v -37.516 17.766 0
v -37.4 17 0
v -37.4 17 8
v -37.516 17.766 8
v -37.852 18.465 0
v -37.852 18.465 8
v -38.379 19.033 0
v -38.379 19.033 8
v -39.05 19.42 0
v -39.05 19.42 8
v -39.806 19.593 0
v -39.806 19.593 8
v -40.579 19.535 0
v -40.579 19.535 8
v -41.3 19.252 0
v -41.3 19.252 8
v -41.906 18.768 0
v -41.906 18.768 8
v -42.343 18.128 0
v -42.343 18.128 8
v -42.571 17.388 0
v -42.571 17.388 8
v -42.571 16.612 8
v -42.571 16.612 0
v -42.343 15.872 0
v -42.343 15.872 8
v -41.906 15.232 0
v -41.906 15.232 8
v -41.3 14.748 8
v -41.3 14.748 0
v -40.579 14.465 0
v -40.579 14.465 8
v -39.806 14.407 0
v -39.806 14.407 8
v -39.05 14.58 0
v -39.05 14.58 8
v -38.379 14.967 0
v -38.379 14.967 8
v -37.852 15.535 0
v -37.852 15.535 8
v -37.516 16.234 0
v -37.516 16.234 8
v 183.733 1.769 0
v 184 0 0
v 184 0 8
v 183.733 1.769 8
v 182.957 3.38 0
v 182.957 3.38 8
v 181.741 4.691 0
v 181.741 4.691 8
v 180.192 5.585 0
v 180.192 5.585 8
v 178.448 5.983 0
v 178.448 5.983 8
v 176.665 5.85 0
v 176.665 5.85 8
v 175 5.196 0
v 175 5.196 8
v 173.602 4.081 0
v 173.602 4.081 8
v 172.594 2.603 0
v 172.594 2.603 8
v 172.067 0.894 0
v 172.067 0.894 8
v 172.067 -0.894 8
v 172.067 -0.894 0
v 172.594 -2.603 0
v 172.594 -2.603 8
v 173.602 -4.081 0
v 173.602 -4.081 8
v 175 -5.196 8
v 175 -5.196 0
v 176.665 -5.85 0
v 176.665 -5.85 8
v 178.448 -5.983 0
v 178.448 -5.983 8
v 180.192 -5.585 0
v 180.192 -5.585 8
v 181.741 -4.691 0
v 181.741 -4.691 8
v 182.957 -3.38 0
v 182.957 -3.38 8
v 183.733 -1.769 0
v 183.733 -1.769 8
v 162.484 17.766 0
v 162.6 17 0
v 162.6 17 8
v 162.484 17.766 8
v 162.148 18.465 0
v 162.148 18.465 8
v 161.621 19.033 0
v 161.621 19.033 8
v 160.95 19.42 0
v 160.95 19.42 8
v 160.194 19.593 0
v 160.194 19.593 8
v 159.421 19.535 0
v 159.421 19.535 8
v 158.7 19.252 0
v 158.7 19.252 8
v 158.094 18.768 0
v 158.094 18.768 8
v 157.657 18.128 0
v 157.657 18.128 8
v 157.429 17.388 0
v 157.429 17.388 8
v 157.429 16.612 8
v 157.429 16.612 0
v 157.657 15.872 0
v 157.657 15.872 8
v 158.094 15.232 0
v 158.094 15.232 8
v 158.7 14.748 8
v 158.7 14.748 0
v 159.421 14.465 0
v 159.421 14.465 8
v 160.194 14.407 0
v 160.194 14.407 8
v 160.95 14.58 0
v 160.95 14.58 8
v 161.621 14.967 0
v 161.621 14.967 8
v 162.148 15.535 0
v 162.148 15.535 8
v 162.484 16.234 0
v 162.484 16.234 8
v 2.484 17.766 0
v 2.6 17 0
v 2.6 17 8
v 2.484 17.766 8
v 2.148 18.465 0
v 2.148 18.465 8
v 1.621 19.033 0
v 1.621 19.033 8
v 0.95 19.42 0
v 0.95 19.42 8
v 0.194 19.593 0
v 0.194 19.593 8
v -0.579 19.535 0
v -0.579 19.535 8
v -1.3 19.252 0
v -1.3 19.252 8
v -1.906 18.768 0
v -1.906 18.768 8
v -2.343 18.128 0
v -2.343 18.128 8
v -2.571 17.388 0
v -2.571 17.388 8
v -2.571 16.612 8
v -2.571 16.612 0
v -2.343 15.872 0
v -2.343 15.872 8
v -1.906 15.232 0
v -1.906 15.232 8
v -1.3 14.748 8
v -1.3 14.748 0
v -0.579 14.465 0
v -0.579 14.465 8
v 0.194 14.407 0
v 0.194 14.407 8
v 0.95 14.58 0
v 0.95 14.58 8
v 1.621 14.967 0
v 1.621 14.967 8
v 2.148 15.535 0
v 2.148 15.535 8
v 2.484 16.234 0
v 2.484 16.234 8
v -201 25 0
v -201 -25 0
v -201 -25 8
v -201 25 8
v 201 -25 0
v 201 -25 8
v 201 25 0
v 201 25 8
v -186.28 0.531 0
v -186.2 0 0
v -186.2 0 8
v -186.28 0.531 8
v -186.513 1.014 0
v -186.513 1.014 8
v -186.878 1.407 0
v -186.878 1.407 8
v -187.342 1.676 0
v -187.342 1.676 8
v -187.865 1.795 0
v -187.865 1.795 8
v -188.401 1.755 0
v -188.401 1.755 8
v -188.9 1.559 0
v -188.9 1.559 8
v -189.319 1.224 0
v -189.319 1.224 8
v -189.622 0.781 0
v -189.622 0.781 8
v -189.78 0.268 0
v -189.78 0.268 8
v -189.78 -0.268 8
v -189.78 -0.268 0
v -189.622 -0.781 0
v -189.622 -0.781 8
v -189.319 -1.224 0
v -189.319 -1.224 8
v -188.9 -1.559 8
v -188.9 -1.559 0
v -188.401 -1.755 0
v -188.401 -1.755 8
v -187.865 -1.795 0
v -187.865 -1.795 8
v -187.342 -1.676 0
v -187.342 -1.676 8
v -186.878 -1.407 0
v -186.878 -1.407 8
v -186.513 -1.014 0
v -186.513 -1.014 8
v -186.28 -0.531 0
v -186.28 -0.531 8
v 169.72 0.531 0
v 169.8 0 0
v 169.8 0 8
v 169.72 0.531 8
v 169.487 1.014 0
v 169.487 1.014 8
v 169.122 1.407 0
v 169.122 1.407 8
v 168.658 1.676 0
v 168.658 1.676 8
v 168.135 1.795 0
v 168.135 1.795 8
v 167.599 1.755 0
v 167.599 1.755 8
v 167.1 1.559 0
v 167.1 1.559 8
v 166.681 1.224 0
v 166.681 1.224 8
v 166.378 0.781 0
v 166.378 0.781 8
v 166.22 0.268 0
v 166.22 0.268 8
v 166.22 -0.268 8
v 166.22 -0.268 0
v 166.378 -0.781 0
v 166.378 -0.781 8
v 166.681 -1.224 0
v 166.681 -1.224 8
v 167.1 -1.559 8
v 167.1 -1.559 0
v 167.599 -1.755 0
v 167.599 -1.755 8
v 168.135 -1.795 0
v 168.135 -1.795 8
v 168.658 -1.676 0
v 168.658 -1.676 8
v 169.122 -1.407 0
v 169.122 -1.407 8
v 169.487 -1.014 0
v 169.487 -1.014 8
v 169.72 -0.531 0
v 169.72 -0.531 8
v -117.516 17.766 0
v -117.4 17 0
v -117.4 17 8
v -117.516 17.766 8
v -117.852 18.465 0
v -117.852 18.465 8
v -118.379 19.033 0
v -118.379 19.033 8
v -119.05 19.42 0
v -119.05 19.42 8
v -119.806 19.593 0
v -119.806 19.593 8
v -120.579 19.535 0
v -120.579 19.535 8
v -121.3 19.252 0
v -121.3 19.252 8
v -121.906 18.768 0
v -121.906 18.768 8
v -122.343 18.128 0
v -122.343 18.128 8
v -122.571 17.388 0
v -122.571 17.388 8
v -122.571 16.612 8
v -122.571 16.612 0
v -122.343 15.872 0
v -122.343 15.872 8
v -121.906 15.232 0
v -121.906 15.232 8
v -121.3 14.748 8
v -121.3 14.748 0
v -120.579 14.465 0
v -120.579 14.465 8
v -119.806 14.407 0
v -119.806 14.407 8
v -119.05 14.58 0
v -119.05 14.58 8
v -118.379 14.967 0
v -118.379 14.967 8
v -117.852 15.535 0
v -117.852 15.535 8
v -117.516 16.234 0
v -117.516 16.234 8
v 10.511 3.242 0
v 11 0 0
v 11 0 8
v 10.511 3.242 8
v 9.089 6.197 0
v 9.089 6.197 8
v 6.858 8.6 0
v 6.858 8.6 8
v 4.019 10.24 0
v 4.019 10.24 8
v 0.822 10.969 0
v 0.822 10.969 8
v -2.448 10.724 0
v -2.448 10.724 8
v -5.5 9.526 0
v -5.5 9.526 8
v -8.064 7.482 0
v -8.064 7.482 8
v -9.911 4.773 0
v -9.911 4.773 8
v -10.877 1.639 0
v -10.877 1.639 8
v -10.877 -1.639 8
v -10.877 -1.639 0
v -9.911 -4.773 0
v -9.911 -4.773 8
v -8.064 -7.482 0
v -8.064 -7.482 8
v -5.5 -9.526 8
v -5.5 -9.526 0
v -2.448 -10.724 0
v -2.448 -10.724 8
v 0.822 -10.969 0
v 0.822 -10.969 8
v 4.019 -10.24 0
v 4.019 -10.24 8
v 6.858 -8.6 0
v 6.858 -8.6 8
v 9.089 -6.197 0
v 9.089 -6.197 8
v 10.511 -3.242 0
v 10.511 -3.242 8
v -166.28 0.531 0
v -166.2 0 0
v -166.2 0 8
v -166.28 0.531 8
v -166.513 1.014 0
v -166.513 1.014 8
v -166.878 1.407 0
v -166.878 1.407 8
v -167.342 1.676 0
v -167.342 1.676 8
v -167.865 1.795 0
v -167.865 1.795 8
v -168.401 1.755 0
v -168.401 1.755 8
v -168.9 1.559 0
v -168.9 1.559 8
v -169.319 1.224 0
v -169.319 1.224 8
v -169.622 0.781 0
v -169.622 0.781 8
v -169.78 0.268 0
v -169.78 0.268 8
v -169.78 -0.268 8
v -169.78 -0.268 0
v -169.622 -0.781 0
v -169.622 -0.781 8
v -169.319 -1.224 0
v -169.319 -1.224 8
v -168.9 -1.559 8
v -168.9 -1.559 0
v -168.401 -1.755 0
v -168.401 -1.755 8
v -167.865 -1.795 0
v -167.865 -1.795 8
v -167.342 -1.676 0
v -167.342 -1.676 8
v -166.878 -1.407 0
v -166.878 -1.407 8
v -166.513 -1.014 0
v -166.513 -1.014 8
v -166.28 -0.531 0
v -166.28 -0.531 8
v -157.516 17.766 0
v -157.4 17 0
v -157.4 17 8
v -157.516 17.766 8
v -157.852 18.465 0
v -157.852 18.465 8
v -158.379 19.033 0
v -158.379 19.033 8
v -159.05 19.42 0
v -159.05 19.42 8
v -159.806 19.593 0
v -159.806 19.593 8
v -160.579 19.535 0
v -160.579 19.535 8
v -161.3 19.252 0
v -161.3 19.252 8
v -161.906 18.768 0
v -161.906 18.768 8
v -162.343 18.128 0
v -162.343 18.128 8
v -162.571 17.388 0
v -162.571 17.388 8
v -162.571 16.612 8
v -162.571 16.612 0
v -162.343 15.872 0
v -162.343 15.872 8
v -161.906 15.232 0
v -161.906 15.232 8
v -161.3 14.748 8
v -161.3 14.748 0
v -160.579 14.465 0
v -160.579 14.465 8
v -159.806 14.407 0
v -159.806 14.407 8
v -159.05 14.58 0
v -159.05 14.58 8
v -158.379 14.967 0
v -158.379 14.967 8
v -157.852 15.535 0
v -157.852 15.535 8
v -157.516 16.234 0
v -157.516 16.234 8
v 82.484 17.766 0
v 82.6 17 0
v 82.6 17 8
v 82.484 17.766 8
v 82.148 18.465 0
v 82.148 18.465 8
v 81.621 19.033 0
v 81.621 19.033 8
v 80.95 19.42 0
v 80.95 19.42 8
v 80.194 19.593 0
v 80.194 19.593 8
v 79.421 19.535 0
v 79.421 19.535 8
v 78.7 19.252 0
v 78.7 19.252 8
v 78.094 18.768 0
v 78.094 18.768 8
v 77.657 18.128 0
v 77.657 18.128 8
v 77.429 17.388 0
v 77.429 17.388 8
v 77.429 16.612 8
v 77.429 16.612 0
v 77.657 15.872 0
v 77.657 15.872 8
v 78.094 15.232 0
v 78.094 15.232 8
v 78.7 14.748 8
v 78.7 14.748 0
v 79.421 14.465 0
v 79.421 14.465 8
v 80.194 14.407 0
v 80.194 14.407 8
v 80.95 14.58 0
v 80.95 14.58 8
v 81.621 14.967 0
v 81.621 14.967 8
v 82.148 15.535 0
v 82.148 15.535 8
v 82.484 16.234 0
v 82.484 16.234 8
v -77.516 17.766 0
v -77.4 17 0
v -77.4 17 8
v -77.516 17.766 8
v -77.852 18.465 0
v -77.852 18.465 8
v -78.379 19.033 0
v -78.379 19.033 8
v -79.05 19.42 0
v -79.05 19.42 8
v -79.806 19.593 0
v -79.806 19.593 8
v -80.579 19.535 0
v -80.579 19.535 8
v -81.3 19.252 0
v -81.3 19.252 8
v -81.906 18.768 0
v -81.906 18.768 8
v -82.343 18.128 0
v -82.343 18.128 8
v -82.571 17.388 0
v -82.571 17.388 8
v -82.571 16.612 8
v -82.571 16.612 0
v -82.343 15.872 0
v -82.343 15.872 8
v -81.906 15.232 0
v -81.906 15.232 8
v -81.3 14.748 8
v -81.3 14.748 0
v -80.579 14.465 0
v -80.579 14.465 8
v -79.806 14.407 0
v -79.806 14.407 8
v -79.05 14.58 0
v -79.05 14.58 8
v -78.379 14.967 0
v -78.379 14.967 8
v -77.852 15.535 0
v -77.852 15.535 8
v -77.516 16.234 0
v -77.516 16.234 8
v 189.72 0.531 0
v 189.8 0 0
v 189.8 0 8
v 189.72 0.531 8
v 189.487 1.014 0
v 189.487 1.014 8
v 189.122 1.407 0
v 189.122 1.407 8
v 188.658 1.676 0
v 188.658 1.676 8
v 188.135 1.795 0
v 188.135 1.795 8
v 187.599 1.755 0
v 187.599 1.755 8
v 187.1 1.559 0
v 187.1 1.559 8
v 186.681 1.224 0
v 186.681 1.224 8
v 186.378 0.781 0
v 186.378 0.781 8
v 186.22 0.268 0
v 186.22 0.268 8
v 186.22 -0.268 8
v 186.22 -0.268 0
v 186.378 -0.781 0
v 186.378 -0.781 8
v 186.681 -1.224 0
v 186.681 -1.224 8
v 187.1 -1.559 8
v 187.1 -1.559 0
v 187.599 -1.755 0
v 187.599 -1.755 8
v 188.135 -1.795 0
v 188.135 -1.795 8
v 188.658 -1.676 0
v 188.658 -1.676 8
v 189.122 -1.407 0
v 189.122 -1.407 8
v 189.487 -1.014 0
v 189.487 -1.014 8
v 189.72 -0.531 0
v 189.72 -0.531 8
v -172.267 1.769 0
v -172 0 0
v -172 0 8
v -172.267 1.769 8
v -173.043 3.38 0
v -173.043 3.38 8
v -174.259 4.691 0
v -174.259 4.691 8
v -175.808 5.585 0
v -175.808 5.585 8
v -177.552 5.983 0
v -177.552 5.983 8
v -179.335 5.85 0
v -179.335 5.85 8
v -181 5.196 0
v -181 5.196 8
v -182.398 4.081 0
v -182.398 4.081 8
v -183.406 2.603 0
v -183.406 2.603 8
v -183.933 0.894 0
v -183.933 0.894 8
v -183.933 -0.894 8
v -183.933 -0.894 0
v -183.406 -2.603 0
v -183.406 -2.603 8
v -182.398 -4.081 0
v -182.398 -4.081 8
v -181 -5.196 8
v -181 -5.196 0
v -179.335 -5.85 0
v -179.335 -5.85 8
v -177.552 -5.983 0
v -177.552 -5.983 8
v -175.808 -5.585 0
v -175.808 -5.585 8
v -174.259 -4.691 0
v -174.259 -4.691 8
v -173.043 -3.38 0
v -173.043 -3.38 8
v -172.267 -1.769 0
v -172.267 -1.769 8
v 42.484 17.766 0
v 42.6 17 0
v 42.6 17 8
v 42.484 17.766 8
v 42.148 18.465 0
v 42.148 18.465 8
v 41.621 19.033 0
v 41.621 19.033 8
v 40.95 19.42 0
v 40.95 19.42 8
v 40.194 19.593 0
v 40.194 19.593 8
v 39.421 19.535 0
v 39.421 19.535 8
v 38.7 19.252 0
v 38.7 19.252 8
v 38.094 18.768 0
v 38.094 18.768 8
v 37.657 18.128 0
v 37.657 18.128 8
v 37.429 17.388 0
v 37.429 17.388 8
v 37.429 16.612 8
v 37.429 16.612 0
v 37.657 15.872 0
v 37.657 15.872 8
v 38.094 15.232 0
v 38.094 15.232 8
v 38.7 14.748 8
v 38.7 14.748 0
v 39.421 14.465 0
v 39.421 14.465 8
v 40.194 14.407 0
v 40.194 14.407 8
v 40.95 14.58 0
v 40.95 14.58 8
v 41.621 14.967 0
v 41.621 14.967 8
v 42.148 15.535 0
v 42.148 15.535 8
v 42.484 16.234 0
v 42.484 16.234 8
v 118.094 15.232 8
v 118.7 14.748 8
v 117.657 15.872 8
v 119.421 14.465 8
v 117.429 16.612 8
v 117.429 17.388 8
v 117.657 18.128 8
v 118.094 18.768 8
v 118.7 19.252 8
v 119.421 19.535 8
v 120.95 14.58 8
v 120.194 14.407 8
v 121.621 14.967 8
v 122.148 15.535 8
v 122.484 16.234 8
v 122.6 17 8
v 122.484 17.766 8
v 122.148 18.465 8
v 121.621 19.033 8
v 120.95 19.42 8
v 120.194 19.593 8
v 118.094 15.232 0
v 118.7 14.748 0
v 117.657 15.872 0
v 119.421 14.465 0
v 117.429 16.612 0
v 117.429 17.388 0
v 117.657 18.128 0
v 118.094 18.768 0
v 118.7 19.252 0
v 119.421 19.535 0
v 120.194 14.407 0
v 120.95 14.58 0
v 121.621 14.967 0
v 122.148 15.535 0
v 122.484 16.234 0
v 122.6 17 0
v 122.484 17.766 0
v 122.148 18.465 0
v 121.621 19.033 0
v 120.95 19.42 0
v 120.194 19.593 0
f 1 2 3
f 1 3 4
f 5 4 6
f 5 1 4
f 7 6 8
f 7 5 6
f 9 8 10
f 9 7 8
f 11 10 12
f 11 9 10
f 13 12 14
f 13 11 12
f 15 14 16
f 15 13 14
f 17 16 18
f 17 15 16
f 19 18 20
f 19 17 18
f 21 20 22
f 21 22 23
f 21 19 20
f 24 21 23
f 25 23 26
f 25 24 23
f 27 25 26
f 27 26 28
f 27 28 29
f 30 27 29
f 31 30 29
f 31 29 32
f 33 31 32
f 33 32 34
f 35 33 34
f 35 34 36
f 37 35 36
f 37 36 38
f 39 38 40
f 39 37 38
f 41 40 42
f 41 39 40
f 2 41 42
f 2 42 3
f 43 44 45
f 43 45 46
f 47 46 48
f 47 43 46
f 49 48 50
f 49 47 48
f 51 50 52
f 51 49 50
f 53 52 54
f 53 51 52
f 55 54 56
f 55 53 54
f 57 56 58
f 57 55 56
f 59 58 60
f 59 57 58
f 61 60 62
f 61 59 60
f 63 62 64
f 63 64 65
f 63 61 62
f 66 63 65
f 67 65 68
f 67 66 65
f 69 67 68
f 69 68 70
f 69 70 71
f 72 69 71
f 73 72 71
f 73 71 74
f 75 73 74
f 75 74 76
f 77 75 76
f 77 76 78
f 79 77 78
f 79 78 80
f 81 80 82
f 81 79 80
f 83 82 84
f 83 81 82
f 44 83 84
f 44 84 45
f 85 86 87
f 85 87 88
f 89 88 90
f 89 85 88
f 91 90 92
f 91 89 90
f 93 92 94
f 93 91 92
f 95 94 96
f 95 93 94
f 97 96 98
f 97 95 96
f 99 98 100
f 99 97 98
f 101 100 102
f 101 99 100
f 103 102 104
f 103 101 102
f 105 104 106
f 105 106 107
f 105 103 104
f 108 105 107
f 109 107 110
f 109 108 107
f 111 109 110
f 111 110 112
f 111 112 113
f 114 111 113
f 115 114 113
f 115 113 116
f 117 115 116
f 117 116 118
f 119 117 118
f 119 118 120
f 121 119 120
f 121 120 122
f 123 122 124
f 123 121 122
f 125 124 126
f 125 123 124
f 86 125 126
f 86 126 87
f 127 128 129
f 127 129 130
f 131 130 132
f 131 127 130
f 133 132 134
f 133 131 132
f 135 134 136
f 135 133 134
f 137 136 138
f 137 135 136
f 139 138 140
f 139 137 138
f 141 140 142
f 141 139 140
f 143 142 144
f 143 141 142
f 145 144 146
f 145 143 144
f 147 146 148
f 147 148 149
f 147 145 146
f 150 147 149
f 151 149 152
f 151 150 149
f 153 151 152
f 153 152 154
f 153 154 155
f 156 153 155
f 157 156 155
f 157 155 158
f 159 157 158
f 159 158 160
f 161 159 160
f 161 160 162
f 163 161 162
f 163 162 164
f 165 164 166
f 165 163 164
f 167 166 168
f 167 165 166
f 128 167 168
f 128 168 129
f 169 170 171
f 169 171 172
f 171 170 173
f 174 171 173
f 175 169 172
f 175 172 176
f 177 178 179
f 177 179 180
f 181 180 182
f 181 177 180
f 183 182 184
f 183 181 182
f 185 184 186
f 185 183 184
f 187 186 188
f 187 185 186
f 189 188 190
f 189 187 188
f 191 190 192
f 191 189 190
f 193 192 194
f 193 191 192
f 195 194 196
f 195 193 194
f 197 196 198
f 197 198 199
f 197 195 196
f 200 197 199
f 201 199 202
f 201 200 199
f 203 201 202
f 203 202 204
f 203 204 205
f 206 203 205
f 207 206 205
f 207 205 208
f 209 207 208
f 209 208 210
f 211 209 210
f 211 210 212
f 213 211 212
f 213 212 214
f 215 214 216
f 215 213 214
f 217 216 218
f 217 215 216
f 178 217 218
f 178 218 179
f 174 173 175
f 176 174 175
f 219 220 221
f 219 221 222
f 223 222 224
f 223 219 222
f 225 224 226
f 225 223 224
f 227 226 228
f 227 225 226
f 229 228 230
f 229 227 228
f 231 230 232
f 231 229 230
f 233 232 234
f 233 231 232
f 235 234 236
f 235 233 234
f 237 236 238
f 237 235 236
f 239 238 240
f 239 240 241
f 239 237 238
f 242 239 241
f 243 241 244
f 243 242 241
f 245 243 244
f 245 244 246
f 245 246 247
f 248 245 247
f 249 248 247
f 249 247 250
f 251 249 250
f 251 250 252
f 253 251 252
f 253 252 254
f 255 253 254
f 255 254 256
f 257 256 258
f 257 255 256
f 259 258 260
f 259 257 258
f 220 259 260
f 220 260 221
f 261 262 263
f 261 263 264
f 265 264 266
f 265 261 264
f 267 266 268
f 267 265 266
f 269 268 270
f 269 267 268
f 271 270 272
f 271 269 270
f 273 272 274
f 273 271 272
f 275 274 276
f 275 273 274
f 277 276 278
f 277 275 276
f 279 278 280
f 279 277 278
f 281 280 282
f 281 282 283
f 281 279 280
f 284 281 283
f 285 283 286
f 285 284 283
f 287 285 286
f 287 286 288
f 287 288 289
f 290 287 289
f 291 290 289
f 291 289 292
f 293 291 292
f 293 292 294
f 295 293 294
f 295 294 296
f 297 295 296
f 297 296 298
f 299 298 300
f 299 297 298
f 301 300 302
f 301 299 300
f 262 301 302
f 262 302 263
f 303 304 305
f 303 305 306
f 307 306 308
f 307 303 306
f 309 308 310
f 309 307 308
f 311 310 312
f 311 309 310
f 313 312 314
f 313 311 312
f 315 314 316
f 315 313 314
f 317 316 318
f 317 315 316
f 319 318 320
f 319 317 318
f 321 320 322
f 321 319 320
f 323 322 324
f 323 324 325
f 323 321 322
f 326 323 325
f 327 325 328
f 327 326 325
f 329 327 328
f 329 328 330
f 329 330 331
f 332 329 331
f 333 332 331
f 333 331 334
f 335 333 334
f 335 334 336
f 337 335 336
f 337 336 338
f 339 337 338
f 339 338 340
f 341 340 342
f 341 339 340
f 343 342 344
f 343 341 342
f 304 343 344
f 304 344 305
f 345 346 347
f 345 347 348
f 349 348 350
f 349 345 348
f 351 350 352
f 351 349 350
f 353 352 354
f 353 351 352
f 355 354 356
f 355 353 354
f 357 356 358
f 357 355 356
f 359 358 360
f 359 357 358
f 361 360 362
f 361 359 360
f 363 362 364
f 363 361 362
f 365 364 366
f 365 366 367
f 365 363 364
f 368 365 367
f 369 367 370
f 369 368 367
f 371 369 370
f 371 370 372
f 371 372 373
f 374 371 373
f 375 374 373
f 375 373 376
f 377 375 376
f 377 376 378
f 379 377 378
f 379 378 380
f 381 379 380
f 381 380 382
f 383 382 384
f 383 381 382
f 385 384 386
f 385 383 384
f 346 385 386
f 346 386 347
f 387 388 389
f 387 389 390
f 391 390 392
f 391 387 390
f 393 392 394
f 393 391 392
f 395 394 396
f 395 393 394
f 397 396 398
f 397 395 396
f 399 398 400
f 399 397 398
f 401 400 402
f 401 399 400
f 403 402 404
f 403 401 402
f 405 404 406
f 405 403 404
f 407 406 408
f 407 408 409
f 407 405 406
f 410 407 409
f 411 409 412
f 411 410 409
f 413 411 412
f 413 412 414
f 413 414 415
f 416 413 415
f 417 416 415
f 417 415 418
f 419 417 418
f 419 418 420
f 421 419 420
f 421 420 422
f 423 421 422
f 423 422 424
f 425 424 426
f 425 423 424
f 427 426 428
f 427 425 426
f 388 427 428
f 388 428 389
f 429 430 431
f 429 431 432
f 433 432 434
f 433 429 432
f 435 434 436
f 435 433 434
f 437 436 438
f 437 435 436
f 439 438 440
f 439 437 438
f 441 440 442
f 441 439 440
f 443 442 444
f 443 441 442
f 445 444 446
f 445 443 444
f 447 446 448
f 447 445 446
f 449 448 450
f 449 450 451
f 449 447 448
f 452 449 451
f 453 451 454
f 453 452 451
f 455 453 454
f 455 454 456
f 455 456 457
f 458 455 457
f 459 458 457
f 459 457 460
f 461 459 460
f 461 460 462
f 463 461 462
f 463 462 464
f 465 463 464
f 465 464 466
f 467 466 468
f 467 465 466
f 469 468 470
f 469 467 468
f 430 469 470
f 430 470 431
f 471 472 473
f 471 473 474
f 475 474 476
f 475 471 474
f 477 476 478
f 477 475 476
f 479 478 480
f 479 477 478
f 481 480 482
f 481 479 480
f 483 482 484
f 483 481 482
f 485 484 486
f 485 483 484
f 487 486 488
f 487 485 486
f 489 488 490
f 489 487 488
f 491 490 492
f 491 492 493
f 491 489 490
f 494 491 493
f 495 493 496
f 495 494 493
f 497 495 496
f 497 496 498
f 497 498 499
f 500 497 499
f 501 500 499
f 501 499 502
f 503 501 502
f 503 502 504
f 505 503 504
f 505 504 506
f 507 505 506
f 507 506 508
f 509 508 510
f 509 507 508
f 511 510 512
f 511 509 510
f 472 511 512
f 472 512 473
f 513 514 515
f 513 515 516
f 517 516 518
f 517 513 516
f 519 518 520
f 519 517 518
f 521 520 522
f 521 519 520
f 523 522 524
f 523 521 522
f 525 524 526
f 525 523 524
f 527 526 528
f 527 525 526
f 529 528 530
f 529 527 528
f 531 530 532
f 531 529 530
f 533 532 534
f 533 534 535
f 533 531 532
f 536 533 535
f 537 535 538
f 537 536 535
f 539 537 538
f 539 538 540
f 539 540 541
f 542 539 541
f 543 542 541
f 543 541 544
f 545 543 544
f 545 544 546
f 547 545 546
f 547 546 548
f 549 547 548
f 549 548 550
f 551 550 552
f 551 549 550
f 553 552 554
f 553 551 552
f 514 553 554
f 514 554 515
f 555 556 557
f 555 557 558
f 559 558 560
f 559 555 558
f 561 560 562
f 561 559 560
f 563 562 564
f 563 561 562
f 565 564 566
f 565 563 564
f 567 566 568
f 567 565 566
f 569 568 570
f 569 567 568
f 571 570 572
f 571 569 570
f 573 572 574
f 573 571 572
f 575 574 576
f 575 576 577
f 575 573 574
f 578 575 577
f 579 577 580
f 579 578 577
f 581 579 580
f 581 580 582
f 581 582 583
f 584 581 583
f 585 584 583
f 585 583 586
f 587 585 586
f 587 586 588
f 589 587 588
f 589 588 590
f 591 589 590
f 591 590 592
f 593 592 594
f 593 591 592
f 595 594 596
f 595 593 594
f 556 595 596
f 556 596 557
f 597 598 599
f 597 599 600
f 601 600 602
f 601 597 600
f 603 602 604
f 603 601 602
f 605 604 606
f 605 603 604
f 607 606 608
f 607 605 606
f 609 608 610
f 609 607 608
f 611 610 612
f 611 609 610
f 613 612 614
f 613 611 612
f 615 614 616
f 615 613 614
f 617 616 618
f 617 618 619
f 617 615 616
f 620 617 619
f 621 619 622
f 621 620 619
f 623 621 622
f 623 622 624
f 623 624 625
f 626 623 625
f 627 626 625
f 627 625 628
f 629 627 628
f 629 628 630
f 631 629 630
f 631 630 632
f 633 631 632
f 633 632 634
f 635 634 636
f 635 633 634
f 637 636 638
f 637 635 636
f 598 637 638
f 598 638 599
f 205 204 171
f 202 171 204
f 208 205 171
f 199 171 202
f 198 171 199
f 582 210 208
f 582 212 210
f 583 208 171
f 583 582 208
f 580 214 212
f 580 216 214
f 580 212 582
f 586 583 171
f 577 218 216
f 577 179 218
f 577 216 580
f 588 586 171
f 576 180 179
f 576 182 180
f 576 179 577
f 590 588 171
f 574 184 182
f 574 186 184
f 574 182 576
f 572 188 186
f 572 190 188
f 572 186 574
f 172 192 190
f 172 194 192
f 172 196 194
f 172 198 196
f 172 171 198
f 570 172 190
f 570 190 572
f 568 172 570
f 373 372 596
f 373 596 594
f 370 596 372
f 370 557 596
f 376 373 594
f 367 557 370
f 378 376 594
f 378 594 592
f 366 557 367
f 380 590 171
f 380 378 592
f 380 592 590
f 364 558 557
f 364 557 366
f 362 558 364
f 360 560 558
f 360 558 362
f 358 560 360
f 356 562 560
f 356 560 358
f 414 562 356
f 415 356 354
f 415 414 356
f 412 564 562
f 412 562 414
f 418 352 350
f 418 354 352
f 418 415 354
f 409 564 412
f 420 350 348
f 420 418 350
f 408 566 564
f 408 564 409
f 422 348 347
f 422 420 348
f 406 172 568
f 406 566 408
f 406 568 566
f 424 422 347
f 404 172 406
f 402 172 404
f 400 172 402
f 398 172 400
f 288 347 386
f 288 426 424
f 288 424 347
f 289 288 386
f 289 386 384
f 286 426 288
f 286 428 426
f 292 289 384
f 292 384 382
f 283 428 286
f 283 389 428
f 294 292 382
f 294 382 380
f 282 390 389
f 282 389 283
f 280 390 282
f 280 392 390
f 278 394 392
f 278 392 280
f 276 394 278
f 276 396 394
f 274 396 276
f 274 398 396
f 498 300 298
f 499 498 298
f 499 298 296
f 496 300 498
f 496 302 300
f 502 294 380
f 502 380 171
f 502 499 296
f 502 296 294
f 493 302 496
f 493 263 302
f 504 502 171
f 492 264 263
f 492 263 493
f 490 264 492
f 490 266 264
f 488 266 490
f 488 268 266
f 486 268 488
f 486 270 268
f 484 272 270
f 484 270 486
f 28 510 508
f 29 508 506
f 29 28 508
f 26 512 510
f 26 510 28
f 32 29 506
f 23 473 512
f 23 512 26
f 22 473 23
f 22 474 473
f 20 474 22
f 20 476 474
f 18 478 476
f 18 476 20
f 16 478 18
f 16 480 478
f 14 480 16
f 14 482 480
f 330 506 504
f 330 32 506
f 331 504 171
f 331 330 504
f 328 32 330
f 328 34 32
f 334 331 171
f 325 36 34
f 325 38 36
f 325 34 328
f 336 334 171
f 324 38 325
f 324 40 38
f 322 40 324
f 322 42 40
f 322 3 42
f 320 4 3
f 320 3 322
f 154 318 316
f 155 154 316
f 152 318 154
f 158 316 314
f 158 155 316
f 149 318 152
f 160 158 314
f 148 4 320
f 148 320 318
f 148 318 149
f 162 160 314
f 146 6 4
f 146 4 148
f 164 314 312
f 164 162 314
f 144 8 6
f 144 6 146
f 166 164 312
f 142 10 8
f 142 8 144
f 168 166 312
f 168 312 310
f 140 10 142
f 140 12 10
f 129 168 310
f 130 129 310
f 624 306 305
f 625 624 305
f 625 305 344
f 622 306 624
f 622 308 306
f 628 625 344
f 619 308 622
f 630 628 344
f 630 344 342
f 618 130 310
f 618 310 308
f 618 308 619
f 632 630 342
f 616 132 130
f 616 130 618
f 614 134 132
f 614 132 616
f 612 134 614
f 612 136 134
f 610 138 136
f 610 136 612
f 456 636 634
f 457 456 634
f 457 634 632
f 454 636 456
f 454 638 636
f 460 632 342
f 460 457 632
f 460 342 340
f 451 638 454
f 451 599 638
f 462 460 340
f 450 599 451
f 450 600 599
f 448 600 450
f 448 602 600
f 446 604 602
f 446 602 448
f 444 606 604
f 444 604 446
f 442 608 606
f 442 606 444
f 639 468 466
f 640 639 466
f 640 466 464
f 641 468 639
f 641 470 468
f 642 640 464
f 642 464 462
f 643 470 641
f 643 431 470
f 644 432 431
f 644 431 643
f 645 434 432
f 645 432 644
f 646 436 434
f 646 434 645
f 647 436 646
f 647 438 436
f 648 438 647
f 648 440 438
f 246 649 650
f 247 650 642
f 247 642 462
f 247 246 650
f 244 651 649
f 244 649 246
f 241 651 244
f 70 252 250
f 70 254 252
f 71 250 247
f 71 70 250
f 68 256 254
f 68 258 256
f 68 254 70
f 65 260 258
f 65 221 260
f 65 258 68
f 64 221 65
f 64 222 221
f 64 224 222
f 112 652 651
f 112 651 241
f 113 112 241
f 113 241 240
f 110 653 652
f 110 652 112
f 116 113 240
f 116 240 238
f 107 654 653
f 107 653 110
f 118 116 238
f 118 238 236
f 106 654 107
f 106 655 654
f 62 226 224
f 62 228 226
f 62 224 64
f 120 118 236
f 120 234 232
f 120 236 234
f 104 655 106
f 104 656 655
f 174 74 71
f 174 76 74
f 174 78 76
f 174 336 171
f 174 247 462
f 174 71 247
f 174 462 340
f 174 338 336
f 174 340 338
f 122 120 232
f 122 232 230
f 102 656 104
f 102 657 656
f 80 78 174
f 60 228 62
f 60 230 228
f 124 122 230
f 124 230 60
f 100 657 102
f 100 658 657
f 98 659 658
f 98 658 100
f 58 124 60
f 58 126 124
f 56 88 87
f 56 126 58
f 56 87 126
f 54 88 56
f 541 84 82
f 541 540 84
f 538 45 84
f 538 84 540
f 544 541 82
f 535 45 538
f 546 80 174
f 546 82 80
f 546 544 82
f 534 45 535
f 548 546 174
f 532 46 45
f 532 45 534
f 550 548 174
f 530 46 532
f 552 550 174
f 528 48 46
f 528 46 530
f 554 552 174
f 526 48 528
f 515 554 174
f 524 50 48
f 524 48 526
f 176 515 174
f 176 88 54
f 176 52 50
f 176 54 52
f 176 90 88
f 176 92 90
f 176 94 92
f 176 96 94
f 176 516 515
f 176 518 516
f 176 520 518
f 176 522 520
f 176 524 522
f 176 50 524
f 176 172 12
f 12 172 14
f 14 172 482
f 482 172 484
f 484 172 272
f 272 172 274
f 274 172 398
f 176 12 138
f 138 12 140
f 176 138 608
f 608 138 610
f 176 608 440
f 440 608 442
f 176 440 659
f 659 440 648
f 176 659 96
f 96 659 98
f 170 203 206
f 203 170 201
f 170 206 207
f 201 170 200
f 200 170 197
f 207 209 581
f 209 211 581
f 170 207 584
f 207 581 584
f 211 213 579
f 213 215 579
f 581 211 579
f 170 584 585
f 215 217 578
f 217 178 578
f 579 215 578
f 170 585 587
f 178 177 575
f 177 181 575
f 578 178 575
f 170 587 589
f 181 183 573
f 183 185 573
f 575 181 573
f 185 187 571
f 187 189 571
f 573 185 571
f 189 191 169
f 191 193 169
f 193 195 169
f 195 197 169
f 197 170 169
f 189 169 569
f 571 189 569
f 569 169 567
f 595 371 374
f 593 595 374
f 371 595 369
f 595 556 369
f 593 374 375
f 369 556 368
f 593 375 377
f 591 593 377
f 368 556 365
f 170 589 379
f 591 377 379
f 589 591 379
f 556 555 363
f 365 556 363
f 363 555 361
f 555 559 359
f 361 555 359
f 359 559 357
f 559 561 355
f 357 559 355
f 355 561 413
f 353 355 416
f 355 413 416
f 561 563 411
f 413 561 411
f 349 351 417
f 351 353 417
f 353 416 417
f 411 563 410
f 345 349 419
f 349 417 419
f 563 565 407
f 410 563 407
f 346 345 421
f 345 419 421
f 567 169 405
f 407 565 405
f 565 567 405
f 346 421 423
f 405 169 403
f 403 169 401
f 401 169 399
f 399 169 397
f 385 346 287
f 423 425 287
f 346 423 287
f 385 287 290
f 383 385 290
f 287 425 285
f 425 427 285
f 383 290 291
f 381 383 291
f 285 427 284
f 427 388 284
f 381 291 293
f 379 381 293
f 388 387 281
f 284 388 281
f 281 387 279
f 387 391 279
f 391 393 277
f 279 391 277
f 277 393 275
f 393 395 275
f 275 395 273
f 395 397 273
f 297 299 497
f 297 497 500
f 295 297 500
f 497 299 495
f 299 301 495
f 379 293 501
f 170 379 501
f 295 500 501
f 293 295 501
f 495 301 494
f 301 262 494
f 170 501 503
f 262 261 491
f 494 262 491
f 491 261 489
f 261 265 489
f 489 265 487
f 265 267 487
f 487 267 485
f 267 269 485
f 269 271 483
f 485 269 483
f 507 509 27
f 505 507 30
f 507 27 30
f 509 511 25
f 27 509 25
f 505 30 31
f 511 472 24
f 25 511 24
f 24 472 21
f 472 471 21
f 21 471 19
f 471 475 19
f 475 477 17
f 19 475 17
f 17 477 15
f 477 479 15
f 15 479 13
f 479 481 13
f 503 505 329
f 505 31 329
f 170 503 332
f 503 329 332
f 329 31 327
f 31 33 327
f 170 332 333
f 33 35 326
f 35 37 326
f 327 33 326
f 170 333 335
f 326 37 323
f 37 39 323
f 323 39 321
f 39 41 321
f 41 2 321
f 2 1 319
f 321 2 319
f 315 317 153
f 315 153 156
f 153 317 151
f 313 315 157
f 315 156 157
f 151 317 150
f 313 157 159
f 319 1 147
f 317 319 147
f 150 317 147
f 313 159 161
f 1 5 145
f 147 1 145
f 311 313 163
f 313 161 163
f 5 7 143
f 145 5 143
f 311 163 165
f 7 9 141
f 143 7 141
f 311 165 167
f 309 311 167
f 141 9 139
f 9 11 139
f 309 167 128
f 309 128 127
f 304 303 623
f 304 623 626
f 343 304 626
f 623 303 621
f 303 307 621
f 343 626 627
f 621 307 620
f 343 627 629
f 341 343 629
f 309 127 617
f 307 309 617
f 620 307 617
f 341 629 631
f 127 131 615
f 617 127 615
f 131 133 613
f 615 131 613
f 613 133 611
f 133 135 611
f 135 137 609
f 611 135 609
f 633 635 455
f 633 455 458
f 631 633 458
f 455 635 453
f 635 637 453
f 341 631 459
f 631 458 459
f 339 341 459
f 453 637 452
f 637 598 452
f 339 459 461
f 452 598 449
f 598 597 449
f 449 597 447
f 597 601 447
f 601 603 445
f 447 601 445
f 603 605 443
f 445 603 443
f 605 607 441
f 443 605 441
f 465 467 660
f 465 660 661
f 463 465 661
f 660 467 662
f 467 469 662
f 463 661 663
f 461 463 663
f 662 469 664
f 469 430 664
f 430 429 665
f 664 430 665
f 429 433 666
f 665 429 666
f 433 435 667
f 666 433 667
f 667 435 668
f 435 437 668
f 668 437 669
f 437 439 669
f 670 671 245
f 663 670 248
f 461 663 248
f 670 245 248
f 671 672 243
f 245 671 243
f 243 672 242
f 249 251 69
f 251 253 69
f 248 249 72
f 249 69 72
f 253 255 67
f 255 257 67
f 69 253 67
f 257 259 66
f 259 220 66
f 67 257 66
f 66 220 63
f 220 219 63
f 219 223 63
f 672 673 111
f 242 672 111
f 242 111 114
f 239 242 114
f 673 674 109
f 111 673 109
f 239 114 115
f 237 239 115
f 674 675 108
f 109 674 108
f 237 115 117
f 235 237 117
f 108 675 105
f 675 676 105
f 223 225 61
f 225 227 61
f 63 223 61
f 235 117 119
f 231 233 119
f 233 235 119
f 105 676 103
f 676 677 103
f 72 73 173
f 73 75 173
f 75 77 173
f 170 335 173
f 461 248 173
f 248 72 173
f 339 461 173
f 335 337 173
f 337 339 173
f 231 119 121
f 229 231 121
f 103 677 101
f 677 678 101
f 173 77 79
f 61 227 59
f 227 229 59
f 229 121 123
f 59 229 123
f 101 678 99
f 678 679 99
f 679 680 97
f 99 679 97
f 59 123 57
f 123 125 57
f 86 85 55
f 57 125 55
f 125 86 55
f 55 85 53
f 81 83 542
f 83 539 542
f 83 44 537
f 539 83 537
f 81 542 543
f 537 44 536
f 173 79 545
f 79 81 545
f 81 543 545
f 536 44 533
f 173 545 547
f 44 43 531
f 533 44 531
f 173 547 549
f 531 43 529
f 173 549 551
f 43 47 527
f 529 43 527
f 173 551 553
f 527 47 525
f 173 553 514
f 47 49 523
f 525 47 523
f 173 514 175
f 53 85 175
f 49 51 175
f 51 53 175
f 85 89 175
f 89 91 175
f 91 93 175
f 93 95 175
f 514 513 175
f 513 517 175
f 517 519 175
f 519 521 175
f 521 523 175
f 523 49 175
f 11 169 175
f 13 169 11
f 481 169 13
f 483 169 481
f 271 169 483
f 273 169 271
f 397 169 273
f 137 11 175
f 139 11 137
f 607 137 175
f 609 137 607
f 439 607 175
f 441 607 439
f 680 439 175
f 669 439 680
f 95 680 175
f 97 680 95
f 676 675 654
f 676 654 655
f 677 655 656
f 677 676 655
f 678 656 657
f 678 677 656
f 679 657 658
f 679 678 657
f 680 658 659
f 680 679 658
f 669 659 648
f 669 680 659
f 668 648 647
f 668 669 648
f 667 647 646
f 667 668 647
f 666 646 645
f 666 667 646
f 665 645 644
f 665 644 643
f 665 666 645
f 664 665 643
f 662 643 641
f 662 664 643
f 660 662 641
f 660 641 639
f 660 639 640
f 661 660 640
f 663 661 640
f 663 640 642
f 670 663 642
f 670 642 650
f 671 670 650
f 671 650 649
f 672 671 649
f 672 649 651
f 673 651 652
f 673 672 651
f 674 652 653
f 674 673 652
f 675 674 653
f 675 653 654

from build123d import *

# Parameters (mm, degrees)
SKETCH1_W           = 402
SKETCH1_H           = 50
SKETCH1_R           = 6
SKETCH1_R_2         = 1.8
SKETCH1_R_3         = 11
SKETCH1_R_4         = 2.6
BOSS_EXTRUDE1_DEPTH = 8


with BuildPart() as part:
    # Sketch1 → Boss-Extrude1 (new body)
    with BuildSketch(Plane.XY):
        Rectangle(SKETCH1_W, SKETCH1_H)
        with Locations((-178, 0)):
            Circle(SKETCH1_R, mode=Mode.SUBTRACT)
        with Locations((168, 0)):
            Circle(SKETCH1_R_2, mode=Mode.SUBTRACT)
        Circle(SKETCH1_R_3, mode=Mode.SUBTRACT)
        with Locations((-188, 0)):
            Circle(SKETCH1_R_2, mode=Mode.SUBTRACT)
        with Locations((-168, 0)):
            Circle(SKETCH1_R_2, mode=Mode.SUBTRACT)
        with Locations((188, 0)):
            Circle(SKETCH1_R_2, mode=Mode.SUBTRACT)
        with Locations((178, 0)):
            Circle(SKETCH1_R, mode=Mode.SUBTRACT)
        with Locations((0, 17)):
            Circle(SKETCH1_R_4, mode=Mode.SUBTRACT)
        with Locations((-40, 17)):
            Circle(SKETCH1_R_4, mode=Mode.SUBTRACT)
        with Locations((-80, 17)):
            Circle(SKETCH1_R_4, mode=Mode.SUBTRACT)
        with Locations((-120, 17)):
            Circle(SKETCH1_R_4, mode=Mode.SUBTRACT)
        with Locations((-160, 17)):
            Circle(SKETCH1_R_4, mode=Mode.SUBTRACT)
        with Locations((40, 17)):
            Circle(SKETCH1_R_4, mode=Mode.SUBTRACT)
        with Locations((80, 17)):
            Circle(SKETCH1_R_4, mode=Mode.SUBTRACT)
        with Locations((120, 17)):
            Circle(SKETCH1_R_4, mode=Mode.SUBTRACT)
        with Locations((160, 17)):
            Circle(SKETCH1_R_4, mode=Mode.SUBTRACT)
    extrude(amount=BOSS_EXTRUDE1_DEPTH)


solid = part.part
